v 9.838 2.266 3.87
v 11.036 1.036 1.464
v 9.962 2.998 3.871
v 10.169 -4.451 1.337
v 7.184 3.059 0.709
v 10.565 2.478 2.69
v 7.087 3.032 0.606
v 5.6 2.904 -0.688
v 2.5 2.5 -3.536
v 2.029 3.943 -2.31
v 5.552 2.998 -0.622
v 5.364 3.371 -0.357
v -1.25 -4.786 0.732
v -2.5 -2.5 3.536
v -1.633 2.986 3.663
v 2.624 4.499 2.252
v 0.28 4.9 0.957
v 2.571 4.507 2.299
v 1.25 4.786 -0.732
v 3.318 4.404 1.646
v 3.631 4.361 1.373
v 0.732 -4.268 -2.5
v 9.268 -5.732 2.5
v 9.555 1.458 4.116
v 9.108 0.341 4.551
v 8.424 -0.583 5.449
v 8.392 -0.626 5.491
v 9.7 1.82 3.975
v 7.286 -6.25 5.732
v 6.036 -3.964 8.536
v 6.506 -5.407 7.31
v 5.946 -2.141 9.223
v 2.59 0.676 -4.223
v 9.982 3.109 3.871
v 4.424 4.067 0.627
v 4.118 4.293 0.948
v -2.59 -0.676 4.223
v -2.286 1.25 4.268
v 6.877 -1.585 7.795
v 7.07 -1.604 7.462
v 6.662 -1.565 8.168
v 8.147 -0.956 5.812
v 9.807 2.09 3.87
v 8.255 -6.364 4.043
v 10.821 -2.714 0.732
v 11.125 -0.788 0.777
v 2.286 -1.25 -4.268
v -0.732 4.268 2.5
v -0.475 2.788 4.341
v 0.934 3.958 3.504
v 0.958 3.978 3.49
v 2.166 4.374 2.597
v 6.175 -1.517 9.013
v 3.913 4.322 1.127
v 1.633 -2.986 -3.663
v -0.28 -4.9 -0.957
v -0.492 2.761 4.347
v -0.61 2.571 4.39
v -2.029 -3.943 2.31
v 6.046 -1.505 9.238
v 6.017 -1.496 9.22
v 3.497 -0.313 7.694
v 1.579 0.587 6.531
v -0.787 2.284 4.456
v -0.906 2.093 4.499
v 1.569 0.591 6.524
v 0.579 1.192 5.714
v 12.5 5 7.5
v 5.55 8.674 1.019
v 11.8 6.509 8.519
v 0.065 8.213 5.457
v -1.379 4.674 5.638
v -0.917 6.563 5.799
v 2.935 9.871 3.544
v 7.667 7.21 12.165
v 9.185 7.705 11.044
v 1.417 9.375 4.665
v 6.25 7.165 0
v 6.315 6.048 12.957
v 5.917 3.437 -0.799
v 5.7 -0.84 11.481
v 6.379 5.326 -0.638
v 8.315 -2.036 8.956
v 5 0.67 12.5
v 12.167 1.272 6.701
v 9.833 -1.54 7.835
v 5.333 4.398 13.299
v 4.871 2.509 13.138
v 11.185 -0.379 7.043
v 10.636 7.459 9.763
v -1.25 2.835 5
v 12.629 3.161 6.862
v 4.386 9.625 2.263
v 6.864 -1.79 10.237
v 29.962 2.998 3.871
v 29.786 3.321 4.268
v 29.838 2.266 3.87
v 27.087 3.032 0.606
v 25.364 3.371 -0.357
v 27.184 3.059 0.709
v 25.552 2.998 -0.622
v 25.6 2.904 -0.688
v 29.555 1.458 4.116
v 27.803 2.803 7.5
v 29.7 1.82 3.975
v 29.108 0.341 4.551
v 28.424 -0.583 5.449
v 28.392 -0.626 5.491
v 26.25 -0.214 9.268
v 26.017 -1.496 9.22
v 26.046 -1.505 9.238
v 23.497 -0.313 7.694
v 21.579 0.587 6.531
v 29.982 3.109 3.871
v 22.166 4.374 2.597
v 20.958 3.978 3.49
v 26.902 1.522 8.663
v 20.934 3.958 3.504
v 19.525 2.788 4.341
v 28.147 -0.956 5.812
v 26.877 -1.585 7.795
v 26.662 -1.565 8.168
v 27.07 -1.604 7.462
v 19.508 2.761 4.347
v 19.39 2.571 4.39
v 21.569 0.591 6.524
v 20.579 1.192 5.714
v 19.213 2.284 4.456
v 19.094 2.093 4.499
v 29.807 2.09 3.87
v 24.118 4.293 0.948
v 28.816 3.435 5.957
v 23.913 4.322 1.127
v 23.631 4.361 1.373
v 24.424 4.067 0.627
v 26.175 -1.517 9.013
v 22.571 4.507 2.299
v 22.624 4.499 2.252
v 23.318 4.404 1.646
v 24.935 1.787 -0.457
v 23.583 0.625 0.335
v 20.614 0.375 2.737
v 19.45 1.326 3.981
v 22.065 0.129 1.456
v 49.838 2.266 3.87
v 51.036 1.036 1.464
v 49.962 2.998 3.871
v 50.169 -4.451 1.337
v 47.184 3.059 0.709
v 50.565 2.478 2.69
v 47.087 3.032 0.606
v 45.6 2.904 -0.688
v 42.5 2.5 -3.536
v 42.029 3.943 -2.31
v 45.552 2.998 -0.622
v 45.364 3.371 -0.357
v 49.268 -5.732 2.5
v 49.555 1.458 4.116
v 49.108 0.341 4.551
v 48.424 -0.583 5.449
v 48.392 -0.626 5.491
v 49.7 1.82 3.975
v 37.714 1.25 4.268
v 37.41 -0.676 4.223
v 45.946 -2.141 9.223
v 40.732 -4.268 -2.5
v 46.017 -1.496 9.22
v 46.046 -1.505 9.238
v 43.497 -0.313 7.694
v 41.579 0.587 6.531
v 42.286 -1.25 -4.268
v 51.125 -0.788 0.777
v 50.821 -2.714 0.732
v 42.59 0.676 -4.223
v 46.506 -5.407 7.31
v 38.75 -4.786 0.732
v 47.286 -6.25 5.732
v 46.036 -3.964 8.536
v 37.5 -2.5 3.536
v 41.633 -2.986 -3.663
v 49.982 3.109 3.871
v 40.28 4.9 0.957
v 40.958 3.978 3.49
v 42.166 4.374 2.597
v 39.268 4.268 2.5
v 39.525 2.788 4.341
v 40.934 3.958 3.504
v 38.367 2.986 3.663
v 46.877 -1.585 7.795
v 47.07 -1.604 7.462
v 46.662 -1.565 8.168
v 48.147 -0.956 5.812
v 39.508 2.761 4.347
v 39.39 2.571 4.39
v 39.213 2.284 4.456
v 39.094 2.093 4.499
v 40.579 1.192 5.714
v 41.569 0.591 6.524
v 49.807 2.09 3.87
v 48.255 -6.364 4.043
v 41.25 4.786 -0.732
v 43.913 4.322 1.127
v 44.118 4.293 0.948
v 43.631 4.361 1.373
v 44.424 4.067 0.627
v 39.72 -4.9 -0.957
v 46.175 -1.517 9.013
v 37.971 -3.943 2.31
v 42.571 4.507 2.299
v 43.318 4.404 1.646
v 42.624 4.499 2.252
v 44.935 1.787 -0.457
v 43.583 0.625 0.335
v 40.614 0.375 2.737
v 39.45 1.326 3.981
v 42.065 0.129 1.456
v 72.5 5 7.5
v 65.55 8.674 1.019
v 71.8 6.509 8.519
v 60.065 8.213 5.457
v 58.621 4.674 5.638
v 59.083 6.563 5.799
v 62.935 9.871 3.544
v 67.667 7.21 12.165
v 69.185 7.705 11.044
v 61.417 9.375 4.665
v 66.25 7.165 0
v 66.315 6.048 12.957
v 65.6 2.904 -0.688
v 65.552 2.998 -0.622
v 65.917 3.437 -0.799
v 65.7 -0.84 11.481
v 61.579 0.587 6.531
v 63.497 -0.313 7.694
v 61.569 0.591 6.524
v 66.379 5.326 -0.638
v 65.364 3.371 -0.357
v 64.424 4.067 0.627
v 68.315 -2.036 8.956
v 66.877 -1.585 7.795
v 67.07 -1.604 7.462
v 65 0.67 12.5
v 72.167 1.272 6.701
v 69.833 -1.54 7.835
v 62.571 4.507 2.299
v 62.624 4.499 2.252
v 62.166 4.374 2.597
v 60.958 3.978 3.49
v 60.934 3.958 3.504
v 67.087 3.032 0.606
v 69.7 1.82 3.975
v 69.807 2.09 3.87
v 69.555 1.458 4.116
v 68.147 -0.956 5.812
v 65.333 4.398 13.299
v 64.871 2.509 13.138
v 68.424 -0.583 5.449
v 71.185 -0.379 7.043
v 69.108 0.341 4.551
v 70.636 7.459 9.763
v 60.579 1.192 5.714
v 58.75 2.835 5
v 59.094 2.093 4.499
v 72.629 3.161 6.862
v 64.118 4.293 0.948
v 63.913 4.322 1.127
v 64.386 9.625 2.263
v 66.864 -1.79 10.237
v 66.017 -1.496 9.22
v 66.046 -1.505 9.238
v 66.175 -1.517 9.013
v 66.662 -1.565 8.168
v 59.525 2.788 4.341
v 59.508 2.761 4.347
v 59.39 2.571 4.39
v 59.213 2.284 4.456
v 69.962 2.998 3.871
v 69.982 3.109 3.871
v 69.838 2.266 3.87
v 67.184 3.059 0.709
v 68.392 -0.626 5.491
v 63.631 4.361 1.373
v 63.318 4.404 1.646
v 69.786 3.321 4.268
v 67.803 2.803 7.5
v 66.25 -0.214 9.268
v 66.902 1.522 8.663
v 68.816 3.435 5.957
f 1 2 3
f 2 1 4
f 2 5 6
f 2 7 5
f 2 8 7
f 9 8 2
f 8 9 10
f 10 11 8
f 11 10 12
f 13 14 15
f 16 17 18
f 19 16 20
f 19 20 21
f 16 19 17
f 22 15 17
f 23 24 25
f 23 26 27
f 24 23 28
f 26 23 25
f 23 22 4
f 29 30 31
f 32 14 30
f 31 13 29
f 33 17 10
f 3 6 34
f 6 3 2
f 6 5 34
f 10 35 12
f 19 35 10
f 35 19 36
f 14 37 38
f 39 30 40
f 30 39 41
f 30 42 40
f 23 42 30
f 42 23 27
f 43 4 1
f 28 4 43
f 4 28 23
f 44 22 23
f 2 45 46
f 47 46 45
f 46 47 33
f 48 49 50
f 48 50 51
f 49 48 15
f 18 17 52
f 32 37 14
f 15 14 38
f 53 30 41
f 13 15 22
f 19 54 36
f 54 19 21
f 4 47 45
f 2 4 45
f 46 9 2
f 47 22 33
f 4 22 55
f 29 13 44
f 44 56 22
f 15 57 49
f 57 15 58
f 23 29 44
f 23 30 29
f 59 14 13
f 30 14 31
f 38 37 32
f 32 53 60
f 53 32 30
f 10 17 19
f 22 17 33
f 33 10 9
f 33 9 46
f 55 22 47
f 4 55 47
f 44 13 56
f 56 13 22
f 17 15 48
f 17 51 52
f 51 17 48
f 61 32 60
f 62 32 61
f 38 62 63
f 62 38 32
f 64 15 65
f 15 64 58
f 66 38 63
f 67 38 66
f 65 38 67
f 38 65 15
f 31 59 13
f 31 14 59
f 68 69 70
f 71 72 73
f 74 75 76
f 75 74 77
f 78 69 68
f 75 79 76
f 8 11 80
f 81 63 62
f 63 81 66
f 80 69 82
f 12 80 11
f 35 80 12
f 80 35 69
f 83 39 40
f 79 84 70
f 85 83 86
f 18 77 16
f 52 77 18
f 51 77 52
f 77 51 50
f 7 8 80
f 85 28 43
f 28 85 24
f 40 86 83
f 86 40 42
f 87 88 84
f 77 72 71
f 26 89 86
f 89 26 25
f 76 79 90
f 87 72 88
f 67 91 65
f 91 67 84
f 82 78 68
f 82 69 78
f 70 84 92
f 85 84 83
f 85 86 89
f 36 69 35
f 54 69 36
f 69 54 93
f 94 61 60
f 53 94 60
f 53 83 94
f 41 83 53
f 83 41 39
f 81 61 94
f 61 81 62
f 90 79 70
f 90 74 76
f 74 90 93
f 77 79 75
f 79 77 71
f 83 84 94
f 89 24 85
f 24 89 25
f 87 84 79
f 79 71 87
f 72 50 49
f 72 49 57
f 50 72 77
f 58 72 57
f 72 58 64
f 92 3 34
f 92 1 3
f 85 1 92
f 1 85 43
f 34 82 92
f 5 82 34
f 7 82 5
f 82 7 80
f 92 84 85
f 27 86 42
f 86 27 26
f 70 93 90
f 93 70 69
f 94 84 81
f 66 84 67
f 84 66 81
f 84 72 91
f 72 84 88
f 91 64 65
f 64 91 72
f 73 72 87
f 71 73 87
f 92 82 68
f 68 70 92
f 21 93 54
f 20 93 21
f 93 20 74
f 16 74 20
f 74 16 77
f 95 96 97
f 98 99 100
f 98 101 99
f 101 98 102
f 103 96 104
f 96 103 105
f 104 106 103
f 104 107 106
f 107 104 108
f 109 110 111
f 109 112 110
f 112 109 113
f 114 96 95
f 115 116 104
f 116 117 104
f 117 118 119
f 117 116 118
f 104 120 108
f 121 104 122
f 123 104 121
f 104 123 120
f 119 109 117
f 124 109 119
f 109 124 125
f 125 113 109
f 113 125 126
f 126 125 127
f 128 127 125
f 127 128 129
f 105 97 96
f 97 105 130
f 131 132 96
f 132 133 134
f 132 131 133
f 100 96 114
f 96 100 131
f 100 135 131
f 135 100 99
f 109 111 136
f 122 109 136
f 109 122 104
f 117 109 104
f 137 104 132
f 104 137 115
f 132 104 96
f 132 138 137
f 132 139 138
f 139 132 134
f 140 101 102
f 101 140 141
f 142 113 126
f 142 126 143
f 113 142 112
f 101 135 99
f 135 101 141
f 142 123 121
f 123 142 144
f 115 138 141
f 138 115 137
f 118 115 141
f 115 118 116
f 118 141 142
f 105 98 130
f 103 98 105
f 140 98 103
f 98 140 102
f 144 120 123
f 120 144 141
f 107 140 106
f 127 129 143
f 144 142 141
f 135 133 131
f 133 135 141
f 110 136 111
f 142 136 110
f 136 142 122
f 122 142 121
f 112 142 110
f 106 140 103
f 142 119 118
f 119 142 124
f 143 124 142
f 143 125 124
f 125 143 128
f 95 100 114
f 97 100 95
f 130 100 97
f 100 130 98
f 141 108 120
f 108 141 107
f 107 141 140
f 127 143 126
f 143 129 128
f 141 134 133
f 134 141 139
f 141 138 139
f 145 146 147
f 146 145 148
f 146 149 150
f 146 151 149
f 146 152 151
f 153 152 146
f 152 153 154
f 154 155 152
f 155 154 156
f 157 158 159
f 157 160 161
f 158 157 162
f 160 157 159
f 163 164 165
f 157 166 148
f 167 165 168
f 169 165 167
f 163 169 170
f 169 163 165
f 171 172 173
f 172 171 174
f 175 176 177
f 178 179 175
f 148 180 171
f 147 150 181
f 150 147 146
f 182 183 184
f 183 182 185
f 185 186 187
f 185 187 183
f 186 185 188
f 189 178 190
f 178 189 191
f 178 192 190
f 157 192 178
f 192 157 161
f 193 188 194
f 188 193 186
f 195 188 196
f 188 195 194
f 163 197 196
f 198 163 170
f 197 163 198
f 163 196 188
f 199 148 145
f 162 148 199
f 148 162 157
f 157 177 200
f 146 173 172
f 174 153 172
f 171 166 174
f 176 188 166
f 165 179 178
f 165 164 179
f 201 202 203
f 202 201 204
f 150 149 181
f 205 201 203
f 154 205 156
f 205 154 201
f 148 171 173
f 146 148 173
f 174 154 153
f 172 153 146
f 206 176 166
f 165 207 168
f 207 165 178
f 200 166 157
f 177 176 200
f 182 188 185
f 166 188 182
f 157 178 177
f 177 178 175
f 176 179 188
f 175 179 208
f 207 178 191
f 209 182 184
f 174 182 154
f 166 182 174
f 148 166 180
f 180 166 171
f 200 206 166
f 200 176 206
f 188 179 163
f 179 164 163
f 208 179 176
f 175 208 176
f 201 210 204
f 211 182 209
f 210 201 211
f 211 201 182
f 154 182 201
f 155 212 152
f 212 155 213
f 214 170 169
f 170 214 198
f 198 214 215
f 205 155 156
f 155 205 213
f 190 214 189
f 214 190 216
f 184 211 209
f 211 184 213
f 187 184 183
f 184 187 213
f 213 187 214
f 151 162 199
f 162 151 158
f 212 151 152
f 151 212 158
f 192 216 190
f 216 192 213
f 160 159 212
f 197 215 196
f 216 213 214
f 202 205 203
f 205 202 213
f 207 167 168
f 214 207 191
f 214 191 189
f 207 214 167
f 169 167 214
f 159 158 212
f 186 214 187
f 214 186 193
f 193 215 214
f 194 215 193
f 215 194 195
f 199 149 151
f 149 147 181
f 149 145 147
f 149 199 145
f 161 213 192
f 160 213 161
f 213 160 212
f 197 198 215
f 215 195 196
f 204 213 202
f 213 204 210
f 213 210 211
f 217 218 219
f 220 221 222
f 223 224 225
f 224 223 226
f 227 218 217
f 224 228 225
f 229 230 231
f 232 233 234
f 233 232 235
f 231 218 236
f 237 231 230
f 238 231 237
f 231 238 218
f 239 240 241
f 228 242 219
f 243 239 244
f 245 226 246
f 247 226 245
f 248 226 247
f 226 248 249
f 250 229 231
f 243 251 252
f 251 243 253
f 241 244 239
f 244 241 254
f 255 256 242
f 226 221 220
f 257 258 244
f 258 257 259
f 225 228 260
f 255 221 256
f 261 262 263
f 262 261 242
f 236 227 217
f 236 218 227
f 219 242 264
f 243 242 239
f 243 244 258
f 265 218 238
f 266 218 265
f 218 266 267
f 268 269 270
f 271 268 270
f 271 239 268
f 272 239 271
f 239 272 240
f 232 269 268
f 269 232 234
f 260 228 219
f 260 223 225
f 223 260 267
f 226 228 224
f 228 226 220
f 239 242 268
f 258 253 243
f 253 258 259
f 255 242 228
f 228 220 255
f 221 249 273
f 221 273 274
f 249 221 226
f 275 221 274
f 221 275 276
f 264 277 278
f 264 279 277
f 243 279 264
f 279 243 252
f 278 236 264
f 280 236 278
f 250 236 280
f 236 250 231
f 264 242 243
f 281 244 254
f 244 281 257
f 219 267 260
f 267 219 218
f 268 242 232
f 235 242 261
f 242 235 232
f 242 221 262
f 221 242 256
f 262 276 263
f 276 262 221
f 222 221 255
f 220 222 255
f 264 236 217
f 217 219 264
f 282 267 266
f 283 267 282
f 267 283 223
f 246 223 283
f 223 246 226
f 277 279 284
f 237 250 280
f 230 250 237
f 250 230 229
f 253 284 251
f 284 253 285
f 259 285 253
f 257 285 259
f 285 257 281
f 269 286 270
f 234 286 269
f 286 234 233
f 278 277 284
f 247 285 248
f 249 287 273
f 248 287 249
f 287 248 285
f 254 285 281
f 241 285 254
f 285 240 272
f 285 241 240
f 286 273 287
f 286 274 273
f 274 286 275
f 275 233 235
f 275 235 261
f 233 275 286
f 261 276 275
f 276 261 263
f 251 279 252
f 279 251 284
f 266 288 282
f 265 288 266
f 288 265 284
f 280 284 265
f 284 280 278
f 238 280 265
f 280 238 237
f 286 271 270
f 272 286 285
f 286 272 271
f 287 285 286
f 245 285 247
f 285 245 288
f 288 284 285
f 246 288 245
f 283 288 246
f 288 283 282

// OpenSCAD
module cylinder1(){//幾つかの処理をまとめるにはfunctionではなくmoduleを使います
        rotate([45,45,45]){
            cylinder(10,5,5);
        }
    }
module cylinder2(){
    translate([2.5,5,2.5]){ 
        rotate([30,30,30]){
            cylinder(10,5,5);
        }
    }
}
union(){ // 合体(論理和) 実は書かなくても自動的にやってくれている
    cylinder1();
    cylinder2();
    }

translate([20,0,0]){ 
    intersection(){ //共通部分（論理積）
        cylinder1();
        cylinder2();
    }      
}

translate([40,0,0]){ 
    difference(){ //引き算
        cylinder1();
        cylinder2();
    }
}

translate([60,0,0]){ 
    difference(){ //differenceは呼び出す順番に依って結果が変わる
        cylinder2();
        cylinder1();
    }
}
